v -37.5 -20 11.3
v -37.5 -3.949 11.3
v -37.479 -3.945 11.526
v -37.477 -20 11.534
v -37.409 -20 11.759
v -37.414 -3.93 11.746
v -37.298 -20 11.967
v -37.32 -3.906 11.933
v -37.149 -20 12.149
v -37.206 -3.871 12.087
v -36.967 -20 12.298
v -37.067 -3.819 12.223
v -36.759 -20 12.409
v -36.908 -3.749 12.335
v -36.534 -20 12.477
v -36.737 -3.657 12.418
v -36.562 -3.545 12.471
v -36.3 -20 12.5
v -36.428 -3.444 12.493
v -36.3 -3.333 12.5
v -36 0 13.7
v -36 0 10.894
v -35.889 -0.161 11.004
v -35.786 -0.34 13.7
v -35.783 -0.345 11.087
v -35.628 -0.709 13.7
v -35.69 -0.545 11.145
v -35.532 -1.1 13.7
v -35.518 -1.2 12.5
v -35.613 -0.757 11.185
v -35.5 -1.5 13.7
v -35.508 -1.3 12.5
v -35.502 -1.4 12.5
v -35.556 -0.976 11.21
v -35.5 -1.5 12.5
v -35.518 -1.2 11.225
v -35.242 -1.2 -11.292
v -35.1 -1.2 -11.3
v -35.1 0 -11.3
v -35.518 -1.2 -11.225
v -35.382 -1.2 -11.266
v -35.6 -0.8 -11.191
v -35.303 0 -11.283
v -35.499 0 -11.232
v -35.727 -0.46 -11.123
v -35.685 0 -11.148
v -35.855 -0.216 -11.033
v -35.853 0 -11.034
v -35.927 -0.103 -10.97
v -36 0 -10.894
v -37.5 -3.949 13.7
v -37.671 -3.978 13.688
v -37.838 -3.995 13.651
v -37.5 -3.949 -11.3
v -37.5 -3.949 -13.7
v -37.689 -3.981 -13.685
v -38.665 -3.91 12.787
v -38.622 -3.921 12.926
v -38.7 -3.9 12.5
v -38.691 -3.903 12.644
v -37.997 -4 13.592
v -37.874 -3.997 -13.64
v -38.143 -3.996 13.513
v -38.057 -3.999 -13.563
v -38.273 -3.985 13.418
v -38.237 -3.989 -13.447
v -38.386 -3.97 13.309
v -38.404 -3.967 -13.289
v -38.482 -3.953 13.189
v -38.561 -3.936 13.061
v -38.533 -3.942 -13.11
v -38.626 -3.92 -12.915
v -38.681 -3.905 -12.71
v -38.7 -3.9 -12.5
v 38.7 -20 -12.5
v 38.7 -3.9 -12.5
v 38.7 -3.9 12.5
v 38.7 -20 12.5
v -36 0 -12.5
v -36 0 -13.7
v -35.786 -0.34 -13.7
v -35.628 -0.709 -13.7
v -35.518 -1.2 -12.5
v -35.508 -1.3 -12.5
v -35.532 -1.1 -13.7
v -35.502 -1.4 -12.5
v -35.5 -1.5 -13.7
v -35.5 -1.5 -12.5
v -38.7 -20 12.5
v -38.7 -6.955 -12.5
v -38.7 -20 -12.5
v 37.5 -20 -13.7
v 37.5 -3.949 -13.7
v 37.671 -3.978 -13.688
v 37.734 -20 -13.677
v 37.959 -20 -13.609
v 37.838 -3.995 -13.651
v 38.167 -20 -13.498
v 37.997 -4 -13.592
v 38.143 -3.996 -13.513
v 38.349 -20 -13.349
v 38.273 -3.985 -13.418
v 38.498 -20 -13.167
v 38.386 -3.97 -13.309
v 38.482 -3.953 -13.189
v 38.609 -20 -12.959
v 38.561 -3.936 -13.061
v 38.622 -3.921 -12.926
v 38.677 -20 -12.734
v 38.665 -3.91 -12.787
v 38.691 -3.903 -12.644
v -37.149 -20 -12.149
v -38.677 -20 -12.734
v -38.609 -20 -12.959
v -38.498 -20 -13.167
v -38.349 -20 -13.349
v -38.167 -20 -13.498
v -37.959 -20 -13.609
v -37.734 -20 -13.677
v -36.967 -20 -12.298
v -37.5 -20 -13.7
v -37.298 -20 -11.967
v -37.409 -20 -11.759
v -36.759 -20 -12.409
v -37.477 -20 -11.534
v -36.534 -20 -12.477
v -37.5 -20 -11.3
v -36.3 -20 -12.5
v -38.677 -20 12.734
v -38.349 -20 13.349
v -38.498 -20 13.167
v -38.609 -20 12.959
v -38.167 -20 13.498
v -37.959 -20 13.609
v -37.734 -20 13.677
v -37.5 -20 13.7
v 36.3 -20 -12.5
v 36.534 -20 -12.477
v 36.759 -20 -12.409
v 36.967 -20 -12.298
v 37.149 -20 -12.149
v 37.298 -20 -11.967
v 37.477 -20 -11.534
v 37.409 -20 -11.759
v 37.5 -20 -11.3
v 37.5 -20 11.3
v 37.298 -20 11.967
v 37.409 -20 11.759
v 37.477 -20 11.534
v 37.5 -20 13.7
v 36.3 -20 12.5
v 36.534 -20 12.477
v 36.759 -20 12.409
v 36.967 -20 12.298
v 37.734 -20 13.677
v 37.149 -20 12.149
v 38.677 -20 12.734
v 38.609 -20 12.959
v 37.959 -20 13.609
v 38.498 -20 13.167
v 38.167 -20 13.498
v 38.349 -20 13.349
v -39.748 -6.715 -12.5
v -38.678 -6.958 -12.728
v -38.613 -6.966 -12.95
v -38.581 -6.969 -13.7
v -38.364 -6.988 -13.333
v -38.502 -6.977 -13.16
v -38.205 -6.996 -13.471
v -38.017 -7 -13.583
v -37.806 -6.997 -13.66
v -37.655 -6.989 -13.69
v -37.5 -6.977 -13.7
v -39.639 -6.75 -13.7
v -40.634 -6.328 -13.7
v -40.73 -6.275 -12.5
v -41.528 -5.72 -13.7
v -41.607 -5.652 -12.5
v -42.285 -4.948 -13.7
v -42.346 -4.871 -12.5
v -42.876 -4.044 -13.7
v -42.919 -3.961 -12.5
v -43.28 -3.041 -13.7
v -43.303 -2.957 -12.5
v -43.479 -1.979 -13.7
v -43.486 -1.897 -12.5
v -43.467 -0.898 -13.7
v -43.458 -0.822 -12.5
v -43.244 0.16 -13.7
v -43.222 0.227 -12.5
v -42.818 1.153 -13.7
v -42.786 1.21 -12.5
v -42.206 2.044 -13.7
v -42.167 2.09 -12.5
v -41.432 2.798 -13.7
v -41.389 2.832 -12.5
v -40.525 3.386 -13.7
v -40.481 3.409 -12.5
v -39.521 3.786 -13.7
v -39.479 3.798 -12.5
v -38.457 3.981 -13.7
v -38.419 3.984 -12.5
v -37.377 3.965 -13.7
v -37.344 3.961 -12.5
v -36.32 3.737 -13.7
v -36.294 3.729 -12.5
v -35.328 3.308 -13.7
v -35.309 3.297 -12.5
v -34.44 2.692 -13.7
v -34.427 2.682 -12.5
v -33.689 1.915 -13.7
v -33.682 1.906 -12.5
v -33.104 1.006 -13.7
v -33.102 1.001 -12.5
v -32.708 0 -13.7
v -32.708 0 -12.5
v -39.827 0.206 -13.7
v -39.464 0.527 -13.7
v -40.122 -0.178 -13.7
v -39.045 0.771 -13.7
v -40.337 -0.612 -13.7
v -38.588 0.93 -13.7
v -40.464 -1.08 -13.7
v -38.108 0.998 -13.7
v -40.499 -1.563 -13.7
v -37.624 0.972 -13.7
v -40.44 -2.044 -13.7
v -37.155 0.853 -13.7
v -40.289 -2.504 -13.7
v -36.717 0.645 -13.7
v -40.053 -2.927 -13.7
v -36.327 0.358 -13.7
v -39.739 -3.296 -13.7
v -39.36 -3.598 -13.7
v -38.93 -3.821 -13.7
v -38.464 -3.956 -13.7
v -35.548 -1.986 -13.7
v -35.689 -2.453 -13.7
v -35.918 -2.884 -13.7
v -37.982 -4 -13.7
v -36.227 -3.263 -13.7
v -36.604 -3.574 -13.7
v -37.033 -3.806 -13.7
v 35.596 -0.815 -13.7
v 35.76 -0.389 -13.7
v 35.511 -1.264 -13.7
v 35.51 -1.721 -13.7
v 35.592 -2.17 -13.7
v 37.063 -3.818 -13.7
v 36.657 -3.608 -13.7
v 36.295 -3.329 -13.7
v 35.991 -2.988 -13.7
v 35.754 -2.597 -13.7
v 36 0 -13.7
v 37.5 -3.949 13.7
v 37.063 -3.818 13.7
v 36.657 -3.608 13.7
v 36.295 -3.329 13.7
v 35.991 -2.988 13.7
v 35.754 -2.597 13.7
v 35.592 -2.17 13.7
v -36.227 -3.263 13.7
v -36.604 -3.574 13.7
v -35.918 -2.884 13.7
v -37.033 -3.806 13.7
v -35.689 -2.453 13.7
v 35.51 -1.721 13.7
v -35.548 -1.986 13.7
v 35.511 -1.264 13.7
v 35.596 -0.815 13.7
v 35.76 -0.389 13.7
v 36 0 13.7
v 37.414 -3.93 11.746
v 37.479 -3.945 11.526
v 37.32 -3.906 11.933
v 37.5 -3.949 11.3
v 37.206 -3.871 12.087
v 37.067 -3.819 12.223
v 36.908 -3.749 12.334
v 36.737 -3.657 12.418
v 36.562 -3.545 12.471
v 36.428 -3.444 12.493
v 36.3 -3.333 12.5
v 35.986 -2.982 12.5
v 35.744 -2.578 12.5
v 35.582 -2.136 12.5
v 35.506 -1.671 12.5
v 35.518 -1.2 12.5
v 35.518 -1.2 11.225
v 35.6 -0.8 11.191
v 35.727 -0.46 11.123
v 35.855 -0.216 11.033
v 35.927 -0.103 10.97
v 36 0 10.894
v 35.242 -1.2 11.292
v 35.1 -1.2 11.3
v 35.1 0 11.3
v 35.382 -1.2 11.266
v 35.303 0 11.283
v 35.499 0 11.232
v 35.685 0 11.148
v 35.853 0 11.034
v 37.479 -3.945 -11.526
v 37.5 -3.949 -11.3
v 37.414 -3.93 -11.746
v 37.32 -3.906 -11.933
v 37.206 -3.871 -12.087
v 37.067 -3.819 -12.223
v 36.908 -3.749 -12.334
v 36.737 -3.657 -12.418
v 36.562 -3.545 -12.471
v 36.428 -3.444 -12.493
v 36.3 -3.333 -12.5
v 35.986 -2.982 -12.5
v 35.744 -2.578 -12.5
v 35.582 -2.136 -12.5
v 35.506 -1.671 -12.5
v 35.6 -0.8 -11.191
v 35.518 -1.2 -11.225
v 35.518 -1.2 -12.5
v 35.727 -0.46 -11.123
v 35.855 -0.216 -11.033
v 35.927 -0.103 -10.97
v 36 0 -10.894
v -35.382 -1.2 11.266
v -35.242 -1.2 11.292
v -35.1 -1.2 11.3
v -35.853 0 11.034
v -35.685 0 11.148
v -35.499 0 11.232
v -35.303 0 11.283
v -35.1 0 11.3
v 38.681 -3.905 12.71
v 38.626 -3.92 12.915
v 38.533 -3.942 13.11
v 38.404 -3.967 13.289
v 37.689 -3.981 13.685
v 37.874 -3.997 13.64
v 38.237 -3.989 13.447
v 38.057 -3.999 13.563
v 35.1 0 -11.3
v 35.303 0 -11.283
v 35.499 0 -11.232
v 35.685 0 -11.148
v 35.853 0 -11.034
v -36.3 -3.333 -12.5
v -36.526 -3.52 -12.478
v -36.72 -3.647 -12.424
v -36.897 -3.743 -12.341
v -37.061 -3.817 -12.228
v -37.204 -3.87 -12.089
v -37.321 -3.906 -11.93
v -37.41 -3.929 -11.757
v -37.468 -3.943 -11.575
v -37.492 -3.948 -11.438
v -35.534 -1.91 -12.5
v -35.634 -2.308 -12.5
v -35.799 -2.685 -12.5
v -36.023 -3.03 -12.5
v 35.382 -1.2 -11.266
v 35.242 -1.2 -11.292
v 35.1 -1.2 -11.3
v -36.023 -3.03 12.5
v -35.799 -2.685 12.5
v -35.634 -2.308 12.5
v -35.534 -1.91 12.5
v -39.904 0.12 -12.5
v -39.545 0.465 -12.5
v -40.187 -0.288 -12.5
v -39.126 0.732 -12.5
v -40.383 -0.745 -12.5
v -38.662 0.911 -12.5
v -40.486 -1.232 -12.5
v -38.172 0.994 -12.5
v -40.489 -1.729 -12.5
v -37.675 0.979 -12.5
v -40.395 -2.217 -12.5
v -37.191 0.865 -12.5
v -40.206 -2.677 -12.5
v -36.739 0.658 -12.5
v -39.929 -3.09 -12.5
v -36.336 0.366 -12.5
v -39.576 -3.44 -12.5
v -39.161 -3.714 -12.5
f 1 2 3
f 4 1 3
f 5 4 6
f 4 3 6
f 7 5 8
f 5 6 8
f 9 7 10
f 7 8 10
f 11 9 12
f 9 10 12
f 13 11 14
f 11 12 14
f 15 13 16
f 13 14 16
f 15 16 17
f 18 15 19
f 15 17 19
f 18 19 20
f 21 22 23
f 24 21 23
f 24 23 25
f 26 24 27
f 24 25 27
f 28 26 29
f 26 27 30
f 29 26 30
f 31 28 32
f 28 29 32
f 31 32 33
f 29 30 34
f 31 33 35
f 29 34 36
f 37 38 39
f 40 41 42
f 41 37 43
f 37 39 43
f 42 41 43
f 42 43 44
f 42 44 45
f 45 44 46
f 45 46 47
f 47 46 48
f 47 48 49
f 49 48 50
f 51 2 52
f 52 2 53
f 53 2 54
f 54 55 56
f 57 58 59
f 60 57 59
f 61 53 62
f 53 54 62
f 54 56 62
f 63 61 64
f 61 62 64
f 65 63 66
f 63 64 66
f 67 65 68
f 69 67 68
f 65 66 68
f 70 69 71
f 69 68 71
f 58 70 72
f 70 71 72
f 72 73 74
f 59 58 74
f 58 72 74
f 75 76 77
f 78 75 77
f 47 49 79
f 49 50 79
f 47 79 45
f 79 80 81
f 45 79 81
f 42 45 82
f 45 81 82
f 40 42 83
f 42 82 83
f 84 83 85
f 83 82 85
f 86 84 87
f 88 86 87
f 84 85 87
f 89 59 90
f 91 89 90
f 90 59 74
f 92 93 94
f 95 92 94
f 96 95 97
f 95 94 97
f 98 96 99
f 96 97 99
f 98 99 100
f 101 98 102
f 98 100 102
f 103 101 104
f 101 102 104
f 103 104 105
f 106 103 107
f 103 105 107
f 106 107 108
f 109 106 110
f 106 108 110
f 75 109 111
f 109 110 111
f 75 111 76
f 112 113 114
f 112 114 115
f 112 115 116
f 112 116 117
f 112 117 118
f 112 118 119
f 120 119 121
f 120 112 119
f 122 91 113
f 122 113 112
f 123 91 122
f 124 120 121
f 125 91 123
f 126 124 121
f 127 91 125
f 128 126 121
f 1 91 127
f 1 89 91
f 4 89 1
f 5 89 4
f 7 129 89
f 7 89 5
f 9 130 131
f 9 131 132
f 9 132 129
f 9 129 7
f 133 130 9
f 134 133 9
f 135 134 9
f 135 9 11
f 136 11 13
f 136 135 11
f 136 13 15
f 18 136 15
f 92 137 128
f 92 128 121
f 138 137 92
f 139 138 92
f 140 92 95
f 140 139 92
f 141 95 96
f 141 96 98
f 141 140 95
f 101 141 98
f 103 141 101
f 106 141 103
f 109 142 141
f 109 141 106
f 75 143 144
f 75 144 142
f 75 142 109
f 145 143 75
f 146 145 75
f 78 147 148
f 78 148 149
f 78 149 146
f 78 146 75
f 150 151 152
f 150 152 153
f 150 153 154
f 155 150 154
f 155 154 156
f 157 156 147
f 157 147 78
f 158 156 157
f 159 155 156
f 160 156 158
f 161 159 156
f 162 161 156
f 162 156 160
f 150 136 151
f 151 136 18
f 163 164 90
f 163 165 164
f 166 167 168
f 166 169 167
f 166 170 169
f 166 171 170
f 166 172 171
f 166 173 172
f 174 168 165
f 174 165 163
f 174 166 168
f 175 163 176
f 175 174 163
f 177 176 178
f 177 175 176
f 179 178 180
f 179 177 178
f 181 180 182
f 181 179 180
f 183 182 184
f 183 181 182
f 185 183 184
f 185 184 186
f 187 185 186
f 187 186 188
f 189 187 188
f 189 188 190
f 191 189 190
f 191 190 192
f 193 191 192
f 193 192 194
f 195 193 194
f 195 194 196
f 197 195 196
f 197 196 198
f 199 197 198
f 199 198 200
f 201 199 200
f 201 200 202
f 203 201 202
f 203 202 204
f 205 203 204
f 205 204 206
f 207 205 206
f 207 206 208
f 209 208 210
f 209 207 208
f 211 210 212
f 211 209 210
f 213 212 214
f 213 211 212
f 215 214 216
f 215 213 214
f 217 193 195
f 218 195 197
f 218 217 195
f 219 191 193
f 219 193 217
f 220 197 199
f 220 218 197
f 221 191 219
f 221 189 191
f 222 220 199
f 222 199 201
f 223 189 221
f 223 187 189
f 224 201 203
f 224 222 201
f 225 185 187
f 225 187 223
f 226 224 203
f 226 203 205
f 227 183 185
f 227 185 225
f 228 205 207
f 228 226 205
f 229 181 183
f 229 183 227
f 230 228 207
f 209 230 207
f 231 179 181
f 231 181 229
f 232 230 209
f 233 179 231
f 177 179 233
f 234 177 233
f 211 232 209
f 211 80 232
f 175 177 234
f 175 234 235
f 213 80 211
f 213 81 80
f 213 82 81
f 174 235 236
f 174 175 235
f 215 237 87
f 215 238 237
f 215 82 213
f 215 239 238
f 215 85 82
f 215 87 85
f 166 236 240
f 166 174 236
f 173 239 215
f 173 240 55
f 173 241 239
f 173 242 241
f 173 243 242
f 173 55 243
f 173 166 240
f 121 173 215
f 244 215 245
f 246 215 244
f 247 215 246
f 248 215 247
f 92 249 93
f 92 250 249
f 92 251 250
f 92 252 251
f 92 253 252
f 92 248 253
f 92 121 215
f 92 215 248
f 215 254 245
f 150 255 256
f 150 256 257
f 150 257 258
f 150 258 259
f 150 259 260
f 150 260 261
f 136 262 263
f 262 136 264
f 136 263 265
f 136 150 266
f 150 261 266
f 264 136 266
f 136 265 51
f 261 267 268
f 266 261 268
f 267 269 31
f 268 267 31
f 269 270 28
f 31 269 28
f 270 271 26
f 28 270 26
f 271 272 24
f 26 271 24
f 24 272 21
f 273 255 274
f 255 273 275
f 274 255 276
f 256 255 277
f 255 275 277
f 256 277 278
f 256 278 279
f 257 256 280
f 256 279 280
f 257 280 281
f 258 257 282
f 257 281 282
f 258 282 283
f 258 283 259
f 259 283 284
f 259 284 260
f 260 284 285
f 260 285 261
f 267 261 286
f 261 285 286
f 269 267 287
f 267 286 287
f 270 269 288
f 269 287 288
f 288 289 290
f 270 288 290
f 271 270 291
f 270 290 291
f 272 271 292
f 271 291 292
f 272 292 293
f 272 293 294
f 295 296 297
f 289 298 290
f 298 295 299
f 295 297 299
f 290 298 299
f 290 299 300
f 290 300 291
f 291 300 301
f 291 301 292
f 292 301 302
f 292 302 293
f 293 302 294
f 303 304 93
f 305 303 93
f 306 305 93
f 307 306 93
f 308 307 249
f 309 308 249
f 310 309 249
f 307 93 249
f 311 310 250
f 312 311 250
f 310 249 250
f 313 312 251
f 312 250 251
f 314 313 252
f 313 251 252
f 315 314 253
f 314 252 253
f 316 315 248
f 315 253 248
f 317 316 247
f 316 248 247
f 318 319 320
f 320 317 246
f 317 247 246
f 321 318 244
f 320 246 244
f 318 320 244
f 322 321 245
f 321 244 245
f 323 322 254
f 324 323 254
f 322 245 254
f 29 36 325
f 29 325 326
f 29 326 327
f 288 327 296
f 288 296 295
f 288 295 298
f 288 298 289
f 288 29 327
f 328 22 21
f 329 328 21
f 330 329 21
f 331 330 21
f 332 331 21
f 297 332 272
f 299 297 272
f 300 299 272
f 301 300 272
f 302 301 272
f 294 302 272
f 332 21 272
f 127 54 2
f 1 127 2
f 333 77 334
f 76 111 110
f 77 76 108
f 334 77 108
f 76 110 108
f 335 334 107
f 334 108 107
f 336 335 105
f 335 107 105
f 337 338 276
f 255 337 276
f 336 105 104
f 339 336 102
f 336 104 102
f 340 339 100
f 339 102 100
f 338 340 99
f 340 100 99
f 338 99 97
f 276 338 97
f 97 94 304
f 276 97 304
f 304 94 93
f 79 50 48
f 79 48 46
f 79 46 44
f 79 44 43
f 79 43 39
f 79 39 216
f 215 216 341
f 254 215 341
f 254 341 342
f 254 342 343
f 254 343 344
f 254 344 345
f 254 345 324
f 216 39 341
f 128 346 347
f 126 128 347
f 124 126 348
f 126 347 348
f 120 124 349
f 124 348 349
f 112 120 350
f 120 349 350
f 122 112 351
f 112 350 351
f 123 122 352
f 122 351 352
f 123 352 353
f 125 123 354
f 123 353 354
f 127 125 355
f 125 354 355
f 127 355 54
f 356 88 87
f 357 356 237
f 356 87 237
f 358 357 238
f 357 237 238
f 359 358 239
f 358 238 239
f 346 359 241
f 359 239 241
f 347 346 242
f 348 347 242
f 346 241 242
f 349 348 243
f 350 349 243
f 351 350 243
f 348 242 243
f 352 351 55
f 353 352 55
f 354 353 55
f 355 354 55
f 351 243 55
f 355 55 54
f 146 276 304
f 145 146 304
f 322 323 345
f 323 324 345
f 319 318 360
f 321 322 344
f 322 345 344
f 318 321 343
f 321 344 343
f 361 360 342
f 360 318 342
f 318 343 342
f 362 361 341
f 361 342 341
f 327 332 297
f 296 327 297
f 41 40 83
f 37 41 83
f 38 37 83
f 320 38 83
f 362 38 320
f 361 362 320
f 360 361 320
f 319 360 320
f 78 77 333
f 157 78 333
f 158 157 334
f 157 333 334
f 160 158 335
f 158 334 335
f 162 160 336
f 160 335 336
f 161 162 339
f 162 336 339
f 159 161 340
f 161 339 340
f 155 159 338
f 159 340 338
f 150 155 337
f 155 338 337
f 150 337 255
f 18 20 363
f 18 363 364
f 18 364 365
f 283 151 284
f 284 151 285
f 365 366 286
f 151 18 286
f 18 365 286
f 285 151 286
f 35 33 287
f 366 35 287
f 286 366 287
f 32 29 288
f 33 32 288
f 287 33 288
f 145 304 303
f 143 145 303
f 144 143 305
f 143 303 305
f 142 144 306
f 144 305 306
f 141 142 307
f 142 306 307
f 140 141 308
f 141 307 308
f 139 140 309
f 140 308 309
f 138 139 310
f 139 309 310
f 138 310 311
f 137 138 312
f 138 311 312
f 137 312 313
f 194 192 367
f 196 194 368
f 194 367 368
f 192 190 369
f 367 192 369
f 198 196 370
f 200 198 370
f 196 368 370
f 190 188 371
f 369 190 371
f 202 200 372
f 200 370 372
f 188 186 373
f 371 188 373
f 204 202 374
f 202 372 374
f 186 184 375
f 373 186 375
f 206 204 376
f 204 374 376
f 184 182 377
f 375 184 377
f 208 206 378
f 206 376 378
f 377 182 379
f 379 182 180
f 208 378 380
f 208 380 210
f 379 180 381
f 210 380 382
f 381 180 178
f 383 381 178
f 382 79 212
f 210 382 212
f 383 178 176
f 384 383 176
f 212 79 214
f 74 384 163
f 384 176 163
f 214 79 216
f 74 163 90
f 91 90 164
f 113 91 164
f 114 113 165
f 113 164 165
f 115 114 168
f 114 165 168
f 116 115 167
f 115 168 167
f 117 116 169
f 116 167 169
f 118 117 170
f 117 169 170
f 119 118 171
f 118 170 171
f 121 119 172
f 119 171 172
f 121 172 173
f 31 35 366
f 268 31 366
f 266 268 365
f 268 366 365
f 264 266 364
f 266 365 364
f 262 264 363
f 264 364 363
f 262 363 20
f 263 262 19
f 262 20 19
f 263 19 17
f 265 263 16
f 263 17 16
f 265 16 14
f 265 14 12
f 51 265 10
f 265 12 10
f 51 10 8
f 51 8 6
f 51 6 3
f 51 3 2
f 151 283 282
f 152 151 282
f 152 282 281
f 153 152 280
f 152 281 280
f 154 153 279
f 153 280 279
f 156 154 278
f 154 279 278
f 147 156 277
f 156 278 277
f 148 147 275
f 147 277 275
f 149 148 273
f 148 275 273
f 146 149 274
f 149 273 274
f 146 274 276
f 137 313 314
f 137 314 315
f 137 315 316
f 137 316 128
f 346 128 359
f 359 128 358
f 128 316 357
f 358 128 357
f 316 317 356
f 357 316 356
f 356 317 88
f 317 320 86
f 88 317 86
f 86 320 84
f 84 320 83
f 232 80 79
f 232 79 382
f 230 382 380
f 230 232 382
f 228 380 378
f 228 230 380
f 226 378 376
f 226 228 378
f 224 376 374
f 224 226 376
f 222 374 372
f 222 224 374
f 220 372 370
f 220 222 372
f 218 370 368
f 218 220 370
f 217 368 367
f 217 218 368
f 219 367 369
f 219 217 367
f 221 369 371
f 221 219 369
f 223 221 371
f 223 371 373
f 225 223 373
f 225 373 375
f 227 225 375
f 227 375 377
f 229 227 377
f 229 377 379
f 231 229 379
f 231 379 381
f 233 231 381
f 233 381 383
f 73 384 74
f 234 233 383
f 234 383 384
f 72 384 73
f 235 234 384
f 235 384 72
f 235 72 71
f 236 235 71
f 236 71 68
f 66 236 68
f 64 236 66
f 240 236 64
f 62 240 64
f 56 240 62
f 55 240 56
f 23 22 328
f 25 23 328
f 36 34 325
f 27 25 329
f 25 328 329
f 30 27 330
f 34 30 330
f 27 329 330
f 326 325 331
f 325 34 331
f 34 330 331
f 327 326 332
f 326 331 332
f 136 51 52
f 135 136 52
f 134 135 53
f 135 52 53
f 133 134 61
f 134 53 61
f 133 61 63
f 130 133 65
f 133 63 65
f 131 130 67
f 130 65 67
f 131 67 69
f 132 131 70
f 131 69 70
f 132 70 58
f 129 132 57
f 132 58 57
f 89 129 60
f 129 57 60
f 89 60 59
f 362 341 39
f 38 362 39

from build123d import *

# Parameters (mm, degrees)
F1_DEPTH = 20
F2_DEPTH = 1.2
F4_DEPTH = 30
F5_DEPTH = 1.2


with BuildPart() as f1:
    # F0 (on Front) → F1 (new body)
    with BuildSketch(Plane.XZ):
        with BuildLine():
            ThreePointArc((38.7, 12.5), (38.3485281374, 13.3485281374), (37.5, 13.7))
            Line((37.5, 13.7), (-37.5, 13.7))
            ThreePointArc((-37.5, 13.7), (-38.3485281374, 13.3485281374), (-38.7, 12.5))
            Line((-38.7, 12.5), (-38.7, -12.5))
            ThreePointArc((-38.7, -12.5), (-38.3485281374, -13.3485281374), (-37.5, -13.7))
            Line((-37.5, -13.7), (37.5, -13.7))
            ThreePointArc((37.5, -13.7), (38.3485281374, -13.3485281374), (38.7, -12.5))
            Line((38.7, -12.5), (38.7, 12.5))
        make_face()
        with BuildLine():
            Line((-36.3, 12.5), (36.3, 12.5))
            ThreePointArc((36.3, 12.5), (37.1485281374, 12.1485281374), (37.5, 11.3))
            Line((37.5, 11.3), (37.5, -11.3))
            ThreePointArc((37.5, -11.3), (37.1485281374, -12.1485281374), (36.3, -12.5))
            Line((36.3, -12.5), (-36.3, -12.5))
            ThreePointArc((-36.3, -12.5), (-37.1485281374, -12.1485281374), (-37.5, -11.3))
            Line((-37.5, -11.3), (-37.5, 11.3))
            ThreePointArc((-37.5, 11.3), (-37.1485281374, 12.1485281374), (-36.3, 12.5))
        make_face(mode=Mode.SUBTRACT)
    extrude(amount=F1_DEPTH)

    # F0 (on Front) → F2 (join)
    with BuildSketch(Plane.XZ):
        with BuildLine():
            ThreePointArc((37.5, 11.3), (37.1485281374, 12.1485281374), (36.3, 12.5))
            Line((36.3, 12.5), (-36.3, 12.5))
            ThreePointArc((-36.3, 12.5), (-37.1485281374, 12.1485281374), (-37.5, 11.3))
            Line((-37.5, 11.3), (-37.5, -11.3))
            ThreePointArc((-37.5, -11.3), (-37.1485281374, -12.1485281374), (-36.3, -12.5))
            Line((-36.3, -12.5), (36.3, -12.5))
            ThreePointArc((36.3, -12.5), (37.1485281374, -12.1485281374), (37.5, -11.3))
            Line((37.5, -11.3), (37.5, 11.3))
        make_face()
        with BuildLine():
            Line((-35.1000003621, 11.3000003621), (35.1000003621, 11.3000003621))
            ThreePointArc((35.1000003621, 11.3000003621), (35.9485284995, 10.9485284995), (36.3000003621, 10.1000003621))
            Line((36.3000003621, 10.1000003621), (36.3000003621, -10.1000003621))
            ThreePointArc((36.3000003621, -10.1000003621), (35.9485284995, -10.9485284995), (35.1000003621, -11.3000003621))
            Line((35.1000003621, -11.3000003621), (-35.1000003621, -11.3000003621))
            ThreePointArc((-35.1000003621, -11.3000003621), (-35.9485284995, -10.9485284995), (-36.3000003621, -10.1000003621))
            Line((-36.3000003621, -10.1000003621), (-36.3000003621, 10.1000003621))
            ThreePointArc((-36.3000003621, 10.1000003621), (-35.9485284995, 10.9485284995), (-35.1000003621, 11.3000003621))
        make_face(mode=Mode.SUBTRACT)
    extrude(amount=F2_DEPTH)

    # F3 (on face) → F4 (cut)
    with BuildSketch(Plane(origin=(0, 0, -13.7), x_dir=(1, 0, 0), z_dir=(0, 0, -1))):
        with BuildLine():
            Line((-37.5, 0), (-37.5, 3.9494897428))
            ThreePointArc((-37.5, 3.9494897428), (-40.3371173071, 0.6123724357), (-36, 0))
            Line((-36, 0), (-37.5, 0))
        make_face()
        with BuildLine():
            ThreePointArc((-36, 0), (-35.6282917549, 0.709430585), (-35.5, 1.5))
            ThreePointArc((-35.5, 1.5), (-36.0635083269, 3.0811388301), (-37.5, 3.9494897428))
            Line((-37.5, 3.9494897428), (-37.5, 0))
            Line((-37.5, 0), (-36, 0))
        make_face()
        with BuildLine():
            ThreePointArc((37.5, 3.9494897428), (35.6628826929, 2.3876275643), (36, 0))
            Line((36, 0), (37.5, 0))
            Line((37.5, 0), (37.5, 3.9494897428))
        make_face()
        with BuildLine():
            Line((37.5, 0), (36, 0))
            ThreePointArc((36, 0), (38.790569415, -0.8717082451), (40.5, 1.5))
            ThreePointArc((40.5, 1.5), (39.5811388301, 3.4364916731), (37.5, 3.9494897428))
            Line((37.5, 3.9494897428), (37.5, 0))
        make_face()
    extrude(amount=-F4_DEPTH, mode=Mode.SUBTRACT)

    # F3 (on face) → F5 (join)
    with BuildSketch(Plane(origin=(0, 0, -13.7), x_dir=(1, 0, 0), z_dir=(0, 0, -1))):
        with BuildLine():
            ThreePointArc((-36, 0), (-40.3371173071, 0.6123724357), (-37.5, 3.9494897428))
            Line((-37.5, 3.9494897428), (-37.5, 6.9772255751))
            ThreePointArc((-37.5, 6.9772255751), (-42.5338498913, -1.6135518565), (-32.7084973779, 0))
            Line((-32.7084973779, 0), (-36, 0))
        make_face()
    extrude(amount=-F5_DEPTH)


solid = f1.part
